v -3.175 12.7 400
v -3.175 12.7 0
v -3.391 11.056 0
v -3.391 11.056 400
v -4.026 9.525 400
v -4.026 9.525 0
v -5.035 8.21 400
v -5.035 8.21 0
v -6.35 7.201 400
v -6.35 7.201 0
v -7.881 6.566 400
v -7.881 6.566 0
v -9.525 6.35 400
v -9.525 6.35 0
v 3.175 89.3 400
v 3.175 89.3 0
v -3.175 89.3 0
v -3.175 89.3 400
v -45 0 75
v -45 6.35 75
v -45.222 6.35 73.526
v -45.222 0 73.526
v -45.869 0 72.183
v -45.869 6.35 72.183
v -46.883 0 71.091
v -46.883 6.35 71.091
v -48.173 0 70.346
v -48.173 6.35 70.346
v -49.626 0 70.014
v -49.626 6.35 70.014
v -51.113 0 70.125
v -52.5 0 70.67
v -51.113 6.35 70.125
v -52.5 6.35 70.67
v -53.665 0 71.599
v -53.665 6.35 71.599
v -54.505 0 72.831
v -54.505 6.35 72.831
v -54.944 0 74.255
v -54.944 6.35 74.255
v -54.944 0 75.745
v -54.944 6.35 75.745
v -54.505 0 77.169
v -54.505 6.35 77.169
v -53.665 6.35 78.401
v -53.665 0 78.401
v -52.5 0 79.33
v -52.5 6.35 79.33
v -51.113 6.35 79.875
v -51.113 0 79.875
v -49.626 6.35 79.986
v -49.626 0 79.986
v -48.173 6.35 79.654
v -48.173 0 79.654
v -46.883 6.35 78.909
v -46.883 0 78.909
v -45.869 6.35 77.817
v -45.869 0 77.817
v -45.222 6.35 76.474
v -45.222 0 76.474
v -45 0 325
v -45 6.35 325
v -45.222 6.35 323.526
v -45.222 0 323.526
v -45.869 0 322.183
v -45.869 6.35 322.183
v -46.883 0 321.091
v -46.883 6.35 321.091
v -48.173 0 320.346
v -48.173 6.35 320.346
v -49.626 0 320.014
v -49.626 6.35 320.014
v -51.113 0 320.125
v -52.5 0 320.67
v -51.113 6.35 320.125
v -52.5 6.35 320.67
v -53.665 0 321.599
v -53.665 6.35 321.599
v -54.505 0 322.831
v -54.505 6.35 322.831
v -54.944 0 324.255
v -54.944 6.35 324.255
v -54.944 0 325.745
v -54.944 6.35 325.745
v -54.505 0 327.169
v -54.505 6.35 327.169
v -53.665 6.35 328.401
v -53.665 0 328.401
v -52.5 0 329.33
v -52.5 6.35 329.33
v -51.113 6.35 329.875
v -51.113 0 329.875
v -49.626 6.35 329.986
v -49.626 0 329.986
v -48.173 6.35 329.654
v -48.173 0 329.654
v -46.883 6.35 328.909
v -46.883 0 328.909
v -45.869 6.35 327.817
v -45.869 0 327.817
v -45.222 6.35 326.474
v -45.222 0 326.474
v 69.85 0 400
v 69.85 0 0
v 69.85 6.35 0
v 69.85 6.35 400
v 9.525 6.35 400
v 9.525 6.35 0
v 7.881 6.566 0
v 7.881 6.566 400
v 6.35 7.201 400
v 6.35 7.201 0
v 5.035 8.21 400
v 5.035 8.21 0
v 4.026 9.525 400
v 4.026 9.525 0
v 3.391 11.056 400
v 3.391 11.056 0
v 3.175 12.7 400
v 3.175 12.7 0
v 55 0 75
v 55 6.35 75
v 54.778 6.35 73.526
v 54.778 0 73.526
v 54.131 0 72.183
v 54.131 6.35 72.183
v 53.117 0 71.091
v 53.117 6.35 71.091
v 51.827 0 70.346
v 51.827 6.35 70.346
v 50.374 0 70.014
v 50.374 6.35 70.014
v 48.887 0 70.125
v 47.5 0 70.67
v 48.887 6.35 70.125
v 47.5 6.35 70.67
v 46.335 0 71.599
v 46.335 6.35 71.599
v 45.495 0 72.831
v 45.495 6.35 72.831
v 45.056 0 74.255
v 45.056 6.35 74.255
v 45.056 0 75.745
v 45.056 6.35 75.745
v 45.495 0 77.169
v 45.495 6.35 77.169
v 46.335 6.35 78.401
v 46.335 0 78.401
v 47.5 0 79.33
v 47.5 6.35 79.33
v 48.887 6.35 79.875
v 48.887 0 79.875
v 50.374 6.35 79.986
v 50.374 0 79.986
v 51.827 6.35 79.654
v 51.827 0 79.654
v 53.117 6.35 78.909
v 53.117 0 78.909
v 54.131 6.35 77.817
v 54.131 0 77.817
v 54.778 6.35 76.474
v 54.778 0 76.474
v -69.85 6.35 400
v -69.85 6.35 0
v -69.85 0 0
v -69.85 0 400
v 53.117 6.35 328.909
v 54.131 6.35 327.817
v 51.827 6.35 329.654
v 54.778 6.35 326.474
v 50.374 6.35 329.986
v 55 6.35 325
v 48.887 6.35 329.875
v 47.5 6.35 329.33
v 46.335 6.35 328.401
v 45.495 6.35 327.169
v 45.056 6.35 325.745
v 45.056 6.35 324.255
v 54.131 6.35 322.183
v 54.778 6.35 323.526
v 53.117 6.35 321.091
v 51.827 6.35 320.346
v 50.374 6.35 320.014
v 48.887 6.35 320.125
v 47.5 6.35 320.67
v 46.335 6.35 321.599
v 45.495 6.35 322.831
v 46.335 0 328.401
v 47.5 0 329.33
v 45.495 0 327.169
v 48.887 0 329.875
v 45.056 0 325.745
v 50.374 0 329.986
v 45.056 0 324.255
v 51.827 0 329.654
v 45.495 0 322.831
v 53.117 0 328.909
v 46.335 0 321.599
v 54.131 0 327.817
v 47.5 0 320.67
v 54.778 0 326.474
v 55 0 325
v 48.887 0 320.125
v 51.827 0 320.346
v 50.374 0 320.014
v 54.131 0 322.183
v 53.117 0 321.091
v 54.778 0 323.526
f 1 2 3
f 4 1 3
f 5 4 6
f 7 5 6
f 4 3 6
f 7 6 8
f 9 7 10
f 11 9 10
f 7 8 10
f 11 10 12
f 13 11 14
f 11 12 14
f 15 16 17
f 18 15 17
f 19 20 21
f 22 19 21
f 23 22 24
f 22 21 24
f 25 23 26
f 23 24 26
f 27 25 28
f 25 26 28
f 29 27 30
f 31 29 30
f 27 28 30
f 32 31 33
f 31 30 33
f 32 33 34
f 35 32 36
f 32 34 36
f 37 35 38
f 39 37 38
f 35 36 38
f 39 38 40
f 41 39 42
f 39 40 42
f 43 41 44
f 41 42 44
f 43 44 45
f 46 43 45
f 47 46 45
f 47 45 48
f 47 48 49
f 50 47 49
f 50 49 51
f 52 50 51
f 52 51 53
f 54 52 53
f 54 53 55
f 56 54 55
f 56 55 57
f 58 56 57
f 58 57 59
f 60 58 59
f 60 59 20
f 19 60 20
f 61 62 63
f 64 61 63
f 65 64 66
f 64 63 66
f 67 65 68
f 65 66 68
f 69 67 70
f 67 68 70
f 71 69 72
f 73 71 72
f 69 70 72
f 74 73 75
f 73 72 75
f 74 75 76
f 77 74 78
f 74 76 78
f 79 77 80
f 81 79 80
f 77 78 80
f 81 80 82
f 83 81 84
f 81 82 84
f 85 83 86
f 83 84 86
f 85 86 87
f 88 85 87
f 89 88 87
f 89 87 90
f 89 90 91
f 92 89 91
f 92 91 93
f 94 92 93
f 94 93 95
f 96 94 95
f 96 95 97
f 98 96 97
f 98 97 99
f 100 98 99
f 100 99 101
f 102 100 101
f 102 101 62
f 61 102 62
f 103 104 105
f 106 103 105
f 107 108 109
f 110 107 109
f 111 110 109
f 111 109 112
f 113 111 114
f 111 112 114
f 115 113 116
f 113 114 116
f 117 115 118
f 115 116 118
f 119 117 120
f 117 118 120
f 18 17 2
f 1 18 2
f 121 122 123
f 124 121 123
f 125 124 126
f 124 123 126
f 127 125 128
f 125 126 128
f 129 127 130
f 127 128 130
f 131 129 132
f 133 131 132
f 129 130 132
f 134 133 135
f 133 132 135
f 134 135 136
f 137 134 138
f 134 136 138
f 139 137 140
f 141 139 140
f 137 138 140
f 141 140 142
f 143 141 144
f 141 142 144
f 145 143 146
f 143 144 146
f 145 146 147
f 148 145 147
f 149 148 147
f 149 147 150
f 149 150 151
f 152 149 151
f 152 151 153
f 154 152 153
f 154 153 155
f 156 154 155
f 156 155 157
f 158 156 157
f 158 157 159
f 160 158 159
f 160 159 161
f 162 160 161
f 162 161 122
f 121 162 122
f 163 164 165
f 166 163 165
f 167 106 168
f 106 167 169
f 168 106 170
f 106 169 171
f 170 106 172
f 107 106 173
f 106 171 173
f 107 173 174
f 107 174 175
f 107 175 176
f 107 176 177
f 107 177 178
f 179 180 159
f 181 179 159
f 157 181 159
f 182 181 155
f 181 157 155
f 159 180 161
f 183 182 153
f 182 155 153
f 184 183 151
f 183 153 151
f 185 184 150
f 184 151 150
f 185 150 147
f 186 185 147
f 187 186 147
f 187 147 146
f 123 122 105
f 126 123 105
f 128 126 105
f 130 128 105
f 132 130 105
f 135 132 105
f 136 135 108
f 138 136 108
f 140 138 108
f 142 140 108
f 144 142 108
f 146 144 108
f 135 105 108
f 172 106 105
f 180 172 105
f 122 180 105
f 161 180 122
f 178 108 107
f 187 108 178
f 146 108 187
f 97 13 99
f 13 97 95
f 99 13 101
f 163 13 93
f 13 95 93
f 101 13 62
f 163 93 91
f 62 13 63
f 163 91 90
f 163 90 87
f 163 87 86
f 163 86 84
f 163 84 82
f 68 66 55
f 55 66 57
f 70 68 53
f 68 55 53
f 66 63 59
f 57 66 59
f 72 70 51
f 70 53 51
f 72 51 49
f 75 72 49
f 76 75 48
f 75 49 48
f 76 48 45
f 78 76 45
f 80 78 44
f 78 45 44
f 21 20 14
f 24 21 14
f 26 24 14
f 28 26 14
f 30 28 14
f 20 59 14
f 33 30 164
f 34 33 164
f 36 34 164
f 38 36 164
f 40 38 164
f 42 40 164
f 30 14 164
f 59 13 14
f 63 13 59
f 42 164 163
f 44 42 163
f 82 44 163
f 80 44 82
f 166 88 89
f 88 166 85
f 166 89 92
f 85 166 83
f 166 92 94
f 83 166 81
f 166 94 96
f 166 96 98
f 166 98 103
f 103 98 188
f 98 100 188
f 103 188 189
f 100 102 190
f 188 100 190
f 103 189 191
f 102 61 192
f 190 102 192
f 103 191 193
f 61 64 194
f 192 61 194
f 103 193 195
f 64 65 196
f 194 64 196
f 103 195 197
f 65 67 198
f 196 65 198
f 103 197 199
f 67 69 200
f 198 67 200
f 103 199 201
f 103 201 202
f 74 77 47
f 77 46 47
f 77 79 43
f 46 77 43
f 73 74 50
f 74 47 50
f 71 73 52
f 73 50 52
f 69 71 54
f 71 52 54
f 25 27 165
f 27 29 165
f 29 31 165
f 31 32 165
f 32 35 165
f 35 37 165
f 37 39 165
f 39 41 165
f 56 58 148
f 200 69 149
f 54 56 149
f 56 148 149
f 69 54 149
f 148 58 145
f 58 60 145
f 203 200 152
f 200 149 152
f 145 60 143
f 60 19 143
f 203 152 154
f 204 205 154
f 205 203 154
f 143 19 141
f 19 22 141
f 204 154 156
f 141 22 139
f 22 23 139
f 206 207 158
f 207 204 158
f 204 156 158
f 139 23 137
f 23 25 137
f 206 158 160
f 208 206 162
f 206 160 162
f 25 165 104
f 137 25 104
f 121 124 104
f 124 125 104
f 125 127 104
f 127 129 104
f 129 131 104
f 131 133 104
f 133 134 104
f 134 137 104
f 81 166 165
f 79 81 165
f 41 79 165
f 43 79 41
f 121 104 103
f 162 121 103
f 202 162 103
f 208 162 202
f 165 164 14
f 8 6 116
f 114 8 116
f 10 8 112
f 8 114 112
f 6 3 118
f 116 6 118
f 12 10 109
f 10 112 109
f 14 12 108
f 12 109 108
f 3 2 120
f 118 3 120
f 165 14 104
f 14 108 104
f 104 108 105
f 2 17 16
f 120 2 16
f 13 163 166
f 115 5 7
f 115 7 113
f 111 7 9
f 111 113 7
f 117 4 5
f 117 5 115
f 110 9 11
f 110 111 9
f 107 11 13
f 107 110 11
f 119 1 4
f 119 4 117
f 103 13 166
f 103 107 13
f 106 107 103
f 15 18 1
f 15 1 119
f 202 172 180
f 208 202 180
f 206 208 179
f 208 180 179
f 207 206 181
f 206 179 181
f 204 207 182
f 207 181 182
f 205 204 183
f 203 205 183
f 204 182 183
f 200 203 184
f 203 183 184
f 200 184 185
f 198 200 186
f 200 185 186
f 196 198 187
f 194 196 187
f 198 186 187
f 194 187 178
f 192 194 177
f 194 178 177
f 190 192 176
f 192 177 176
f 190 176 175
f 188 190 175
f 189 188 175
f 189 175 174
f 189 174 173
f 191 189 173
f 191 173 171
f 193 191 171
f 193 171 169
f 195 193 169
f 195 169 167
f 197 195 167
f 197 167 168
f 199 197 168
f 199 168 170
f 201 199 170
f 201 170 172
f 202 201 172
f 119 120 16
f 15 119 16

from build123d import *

# Parameters (mm, degrees)
RESSALTO_EXTRUS_O1_DEPTH = 400
ESBO_O2_R                = 5
CORTE_EXTRUS_O1_DEPTH    = 7.35


with BuildPart() as part:
    # Esboço1 → Ressalto-extrusão1 (new body)
    with BuildSketch(Plane.XY):
        with BuildLine():
            Line((-69.85, 0), (69.85, 0))
            Line((69.85, 0), (69.85, 6.35))
            Line((69.85, 6.35), (9.525, 6.35))
            ThreePointArc((9.525, 6.35), (5.034871939, 8.209871939), (3.175, 12.7))
            Line((3.175, 12.7), (3.175, 89.3))
            Line((3.175, 89.3), (-3.175, 89.3))
            Line((-3.175, 89.3), (-3.175, 12.7))
            ThreePointArc((-3.175, 12.7), (-5.034871939, 8.209871939), (-9.525, 6.35))
            Line((-9.525, 6.35), (-69.85, 6.35))
            Line((-69.85, 6.35), (-69.85, 0))
        make_face()
    extrude(amount=RESSALTO_EXTRUS_O1_DEPTH)

    # Esboço2 → Corte-extrusão1 (cut, through all)
    with BuildSketch(Plane(origin=(0, 6.35, 0), x_dir=(1, 0, 0), z_dir=(0, 1, 0))):
        with Locations((50, -75)):
            Circle(ESBO_O2_R)
        with Locations((-50, -75)):
            Circle(ESBO_O2_R)
        with Locations((50, -325)):
            Circle(ESBO_O2_R)
        with Locations((-50, -325)):
            Circle(ESBO_O2_R)
    extrude(amount=-CORTE_EXTRUS_O1_DEPTH, mode=Mode.SUBTRACT)


solid = part.part
